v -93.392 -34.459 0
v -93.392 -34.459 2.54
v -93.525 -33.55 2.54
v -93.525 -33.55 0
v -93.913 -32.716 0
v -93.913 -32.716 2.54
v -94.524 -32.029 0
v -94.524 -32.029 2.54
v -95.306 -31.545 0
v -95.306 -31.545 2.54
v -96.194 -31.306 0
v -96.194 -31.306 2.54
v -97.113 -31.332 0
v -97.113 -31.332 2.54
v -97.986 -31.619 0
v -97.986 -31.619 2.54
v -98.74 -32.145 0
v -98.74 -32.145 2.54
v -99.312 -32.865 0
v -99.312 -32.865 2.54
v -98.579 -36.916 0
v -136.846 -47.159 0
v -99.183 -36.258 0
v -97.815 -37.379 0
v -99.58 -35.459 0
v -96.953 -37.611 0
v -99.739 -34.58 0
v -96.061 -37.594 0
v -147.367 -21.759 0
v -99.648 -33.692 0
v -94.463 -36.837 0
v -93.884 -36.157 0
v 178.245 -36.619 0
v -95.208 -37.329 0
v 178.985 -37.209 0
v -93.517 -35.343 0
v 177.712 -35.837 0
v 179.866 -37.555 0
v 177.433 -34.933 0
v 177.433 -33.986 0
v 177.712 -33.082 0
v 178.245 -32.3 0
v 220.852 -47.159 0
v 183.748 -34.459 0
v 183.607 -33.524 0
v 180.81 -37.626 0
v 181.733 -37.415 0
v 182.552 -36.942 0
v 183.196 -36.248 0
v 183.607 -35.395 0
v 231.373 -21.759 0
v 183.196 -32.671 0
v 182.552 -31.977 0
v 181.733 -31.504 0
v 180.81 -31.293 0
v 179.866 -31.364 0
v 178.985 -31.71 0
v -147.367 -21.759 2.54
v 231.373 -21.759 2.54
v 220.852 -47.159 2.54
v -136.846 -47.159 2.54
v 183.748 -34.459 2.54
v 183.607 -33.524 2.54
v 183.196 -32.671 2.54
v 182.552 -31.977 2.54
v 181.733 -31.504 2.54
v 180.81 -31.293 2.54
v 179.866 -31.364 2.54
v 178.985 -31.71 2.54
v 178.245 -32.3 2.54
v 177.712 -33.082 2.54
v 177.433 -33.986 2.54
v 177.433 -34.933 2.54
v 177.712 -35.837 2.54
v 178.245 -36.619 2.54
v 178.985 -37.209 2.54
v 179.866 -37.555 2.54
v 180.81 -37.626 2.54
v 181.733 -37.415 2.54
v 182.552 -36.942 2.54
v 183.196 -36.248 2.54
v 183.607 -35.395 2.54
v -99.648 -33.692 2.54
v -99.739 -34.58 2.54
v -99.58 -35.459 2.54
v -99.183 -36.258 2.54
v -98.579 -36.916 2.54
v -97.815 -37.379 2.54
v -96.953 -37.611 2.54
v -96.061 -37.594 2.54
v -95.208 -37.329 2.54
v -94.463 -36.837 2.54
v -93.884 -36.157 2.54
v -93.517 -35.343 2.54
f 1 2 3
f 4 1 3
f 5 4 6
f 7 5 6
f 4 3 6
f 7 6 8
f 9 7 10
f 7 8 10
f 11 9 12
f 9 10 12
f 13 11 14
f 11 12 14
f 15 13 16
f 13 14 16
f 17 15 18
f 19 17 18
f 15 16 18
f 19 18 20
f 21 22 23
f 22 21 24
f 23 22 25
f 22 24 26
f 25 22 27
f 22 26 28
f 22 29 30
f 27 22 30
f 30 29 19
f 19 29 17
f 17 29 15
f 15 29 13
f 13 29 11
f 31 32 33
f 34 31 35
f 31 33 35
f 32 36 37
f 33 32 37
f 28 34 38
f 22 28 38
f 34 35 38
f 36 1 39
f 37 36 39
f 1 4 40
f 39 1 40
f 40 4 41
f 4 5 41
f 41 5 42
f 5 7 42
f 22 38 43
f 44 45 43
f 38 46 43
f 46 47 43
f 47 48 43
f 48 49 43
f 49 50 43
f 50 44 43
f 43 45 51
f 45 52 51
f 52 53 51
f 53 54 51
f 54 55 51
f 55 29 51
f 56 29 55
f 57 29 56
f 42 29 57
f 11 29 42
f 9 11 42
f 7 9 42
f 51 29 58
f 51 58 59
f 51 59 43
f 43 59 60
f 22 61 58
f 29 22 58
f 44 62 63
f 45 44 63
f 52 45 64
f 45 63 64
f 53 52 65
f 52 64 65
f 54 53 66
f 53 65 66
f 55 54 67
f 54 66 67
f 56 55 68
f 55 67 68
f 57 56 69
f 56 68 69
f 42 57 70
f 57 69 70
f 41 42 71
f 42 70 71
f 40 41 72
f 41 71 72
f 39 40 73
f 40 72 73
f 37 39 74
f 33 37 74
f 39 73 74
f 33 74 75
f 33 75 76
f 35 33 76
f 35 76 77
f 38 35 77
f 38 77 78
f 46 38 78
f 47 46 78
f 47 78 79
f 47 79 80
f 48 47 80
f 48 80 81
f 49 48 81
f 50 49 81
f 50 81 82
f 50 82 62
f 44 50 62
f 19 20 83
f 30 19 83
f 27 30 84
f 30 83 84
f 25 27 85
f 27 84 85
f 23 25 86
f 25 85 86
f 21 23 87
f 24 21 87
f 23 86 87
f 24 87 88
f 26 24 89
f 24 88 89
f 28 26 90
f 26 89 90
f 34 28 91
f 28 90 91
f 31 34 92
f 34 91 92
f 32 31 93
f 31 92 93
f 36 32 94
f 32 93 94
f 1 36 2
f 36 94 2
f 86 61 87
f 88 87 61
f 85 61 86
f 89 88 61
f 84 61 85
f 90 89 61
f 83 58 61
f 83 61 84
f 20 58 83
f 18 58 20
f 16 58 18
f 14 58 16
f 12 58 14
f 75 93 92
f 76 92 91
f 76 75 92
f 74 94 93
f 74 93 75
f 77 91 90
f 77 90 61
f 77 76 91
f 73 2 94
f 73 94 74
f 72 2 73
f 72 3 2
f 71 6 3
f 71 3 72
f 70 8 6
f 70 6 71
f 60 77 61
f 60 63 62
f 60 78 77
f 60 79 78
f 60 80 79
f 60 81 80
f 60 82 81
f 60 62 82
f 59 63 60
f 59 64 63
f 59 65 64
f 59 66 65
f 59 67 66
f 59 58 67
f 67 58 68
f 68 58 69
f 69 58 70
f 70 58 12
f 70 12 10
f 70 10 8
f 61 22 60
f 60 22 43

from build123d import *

# Parameters (mm, degrees)
F0_W     = 378.7394
F0_H     = 25.4
F1_DEPTH = 2.54
F3_DEPTH = 2.541
F5_DEPTH = 2.541


with BuildPart() as f1:
    # F0 (on Top) → F1 (new body)
    with BuildSketch(Plane.XY):
        with Locations((42.002925, -34.459395)):
            Rectangle(F0_W, F0_H)
    extrude(amount=F1_DEPTH)

    # F2 (on face) → F3 (cut, through all)
    with BuildSketch(Plane.XY.offset(2.54)):
        Polygon((-136.846095, -47.159395), (-147.366775, -21.759395), (-147.366775, -47.159395), align=None)
        Polygon((231.372625, -47.159395), (231.372625, -21.759395), (220.851945, -47.159395), align=None)
    extrude(amount=-F3_DEPTH, mode=Mode.SUBTRACT)

    # F4 (on face) → F5 (cut, through all)
    with BuildSketch(Plane.XY.offset(2.54)):
        with BuildLine():
            ThreePointArc((-99.312349, -32.86489), (-97.392435, -37.52516), (-93.391775, -34.459395))
            ThreePointArc((-93.391775, -34.459395), (-95.741115, -31.393631), (-99.312349, -32.86489))
        make_face()
        with BuildLine():
            ThreePointArc((177.397625, -34.459395), (180.572625, -37.634395), (183.747625, -34.459395))
            ThreePointArc((183.747625, -34.459395), (180.572625, -31.284395), (177.397625, -34.459395))
        make_face()
    extrude(amount=-F5_DEPTH, mode=Mode.SUBTRACT)


solid = f1.part
